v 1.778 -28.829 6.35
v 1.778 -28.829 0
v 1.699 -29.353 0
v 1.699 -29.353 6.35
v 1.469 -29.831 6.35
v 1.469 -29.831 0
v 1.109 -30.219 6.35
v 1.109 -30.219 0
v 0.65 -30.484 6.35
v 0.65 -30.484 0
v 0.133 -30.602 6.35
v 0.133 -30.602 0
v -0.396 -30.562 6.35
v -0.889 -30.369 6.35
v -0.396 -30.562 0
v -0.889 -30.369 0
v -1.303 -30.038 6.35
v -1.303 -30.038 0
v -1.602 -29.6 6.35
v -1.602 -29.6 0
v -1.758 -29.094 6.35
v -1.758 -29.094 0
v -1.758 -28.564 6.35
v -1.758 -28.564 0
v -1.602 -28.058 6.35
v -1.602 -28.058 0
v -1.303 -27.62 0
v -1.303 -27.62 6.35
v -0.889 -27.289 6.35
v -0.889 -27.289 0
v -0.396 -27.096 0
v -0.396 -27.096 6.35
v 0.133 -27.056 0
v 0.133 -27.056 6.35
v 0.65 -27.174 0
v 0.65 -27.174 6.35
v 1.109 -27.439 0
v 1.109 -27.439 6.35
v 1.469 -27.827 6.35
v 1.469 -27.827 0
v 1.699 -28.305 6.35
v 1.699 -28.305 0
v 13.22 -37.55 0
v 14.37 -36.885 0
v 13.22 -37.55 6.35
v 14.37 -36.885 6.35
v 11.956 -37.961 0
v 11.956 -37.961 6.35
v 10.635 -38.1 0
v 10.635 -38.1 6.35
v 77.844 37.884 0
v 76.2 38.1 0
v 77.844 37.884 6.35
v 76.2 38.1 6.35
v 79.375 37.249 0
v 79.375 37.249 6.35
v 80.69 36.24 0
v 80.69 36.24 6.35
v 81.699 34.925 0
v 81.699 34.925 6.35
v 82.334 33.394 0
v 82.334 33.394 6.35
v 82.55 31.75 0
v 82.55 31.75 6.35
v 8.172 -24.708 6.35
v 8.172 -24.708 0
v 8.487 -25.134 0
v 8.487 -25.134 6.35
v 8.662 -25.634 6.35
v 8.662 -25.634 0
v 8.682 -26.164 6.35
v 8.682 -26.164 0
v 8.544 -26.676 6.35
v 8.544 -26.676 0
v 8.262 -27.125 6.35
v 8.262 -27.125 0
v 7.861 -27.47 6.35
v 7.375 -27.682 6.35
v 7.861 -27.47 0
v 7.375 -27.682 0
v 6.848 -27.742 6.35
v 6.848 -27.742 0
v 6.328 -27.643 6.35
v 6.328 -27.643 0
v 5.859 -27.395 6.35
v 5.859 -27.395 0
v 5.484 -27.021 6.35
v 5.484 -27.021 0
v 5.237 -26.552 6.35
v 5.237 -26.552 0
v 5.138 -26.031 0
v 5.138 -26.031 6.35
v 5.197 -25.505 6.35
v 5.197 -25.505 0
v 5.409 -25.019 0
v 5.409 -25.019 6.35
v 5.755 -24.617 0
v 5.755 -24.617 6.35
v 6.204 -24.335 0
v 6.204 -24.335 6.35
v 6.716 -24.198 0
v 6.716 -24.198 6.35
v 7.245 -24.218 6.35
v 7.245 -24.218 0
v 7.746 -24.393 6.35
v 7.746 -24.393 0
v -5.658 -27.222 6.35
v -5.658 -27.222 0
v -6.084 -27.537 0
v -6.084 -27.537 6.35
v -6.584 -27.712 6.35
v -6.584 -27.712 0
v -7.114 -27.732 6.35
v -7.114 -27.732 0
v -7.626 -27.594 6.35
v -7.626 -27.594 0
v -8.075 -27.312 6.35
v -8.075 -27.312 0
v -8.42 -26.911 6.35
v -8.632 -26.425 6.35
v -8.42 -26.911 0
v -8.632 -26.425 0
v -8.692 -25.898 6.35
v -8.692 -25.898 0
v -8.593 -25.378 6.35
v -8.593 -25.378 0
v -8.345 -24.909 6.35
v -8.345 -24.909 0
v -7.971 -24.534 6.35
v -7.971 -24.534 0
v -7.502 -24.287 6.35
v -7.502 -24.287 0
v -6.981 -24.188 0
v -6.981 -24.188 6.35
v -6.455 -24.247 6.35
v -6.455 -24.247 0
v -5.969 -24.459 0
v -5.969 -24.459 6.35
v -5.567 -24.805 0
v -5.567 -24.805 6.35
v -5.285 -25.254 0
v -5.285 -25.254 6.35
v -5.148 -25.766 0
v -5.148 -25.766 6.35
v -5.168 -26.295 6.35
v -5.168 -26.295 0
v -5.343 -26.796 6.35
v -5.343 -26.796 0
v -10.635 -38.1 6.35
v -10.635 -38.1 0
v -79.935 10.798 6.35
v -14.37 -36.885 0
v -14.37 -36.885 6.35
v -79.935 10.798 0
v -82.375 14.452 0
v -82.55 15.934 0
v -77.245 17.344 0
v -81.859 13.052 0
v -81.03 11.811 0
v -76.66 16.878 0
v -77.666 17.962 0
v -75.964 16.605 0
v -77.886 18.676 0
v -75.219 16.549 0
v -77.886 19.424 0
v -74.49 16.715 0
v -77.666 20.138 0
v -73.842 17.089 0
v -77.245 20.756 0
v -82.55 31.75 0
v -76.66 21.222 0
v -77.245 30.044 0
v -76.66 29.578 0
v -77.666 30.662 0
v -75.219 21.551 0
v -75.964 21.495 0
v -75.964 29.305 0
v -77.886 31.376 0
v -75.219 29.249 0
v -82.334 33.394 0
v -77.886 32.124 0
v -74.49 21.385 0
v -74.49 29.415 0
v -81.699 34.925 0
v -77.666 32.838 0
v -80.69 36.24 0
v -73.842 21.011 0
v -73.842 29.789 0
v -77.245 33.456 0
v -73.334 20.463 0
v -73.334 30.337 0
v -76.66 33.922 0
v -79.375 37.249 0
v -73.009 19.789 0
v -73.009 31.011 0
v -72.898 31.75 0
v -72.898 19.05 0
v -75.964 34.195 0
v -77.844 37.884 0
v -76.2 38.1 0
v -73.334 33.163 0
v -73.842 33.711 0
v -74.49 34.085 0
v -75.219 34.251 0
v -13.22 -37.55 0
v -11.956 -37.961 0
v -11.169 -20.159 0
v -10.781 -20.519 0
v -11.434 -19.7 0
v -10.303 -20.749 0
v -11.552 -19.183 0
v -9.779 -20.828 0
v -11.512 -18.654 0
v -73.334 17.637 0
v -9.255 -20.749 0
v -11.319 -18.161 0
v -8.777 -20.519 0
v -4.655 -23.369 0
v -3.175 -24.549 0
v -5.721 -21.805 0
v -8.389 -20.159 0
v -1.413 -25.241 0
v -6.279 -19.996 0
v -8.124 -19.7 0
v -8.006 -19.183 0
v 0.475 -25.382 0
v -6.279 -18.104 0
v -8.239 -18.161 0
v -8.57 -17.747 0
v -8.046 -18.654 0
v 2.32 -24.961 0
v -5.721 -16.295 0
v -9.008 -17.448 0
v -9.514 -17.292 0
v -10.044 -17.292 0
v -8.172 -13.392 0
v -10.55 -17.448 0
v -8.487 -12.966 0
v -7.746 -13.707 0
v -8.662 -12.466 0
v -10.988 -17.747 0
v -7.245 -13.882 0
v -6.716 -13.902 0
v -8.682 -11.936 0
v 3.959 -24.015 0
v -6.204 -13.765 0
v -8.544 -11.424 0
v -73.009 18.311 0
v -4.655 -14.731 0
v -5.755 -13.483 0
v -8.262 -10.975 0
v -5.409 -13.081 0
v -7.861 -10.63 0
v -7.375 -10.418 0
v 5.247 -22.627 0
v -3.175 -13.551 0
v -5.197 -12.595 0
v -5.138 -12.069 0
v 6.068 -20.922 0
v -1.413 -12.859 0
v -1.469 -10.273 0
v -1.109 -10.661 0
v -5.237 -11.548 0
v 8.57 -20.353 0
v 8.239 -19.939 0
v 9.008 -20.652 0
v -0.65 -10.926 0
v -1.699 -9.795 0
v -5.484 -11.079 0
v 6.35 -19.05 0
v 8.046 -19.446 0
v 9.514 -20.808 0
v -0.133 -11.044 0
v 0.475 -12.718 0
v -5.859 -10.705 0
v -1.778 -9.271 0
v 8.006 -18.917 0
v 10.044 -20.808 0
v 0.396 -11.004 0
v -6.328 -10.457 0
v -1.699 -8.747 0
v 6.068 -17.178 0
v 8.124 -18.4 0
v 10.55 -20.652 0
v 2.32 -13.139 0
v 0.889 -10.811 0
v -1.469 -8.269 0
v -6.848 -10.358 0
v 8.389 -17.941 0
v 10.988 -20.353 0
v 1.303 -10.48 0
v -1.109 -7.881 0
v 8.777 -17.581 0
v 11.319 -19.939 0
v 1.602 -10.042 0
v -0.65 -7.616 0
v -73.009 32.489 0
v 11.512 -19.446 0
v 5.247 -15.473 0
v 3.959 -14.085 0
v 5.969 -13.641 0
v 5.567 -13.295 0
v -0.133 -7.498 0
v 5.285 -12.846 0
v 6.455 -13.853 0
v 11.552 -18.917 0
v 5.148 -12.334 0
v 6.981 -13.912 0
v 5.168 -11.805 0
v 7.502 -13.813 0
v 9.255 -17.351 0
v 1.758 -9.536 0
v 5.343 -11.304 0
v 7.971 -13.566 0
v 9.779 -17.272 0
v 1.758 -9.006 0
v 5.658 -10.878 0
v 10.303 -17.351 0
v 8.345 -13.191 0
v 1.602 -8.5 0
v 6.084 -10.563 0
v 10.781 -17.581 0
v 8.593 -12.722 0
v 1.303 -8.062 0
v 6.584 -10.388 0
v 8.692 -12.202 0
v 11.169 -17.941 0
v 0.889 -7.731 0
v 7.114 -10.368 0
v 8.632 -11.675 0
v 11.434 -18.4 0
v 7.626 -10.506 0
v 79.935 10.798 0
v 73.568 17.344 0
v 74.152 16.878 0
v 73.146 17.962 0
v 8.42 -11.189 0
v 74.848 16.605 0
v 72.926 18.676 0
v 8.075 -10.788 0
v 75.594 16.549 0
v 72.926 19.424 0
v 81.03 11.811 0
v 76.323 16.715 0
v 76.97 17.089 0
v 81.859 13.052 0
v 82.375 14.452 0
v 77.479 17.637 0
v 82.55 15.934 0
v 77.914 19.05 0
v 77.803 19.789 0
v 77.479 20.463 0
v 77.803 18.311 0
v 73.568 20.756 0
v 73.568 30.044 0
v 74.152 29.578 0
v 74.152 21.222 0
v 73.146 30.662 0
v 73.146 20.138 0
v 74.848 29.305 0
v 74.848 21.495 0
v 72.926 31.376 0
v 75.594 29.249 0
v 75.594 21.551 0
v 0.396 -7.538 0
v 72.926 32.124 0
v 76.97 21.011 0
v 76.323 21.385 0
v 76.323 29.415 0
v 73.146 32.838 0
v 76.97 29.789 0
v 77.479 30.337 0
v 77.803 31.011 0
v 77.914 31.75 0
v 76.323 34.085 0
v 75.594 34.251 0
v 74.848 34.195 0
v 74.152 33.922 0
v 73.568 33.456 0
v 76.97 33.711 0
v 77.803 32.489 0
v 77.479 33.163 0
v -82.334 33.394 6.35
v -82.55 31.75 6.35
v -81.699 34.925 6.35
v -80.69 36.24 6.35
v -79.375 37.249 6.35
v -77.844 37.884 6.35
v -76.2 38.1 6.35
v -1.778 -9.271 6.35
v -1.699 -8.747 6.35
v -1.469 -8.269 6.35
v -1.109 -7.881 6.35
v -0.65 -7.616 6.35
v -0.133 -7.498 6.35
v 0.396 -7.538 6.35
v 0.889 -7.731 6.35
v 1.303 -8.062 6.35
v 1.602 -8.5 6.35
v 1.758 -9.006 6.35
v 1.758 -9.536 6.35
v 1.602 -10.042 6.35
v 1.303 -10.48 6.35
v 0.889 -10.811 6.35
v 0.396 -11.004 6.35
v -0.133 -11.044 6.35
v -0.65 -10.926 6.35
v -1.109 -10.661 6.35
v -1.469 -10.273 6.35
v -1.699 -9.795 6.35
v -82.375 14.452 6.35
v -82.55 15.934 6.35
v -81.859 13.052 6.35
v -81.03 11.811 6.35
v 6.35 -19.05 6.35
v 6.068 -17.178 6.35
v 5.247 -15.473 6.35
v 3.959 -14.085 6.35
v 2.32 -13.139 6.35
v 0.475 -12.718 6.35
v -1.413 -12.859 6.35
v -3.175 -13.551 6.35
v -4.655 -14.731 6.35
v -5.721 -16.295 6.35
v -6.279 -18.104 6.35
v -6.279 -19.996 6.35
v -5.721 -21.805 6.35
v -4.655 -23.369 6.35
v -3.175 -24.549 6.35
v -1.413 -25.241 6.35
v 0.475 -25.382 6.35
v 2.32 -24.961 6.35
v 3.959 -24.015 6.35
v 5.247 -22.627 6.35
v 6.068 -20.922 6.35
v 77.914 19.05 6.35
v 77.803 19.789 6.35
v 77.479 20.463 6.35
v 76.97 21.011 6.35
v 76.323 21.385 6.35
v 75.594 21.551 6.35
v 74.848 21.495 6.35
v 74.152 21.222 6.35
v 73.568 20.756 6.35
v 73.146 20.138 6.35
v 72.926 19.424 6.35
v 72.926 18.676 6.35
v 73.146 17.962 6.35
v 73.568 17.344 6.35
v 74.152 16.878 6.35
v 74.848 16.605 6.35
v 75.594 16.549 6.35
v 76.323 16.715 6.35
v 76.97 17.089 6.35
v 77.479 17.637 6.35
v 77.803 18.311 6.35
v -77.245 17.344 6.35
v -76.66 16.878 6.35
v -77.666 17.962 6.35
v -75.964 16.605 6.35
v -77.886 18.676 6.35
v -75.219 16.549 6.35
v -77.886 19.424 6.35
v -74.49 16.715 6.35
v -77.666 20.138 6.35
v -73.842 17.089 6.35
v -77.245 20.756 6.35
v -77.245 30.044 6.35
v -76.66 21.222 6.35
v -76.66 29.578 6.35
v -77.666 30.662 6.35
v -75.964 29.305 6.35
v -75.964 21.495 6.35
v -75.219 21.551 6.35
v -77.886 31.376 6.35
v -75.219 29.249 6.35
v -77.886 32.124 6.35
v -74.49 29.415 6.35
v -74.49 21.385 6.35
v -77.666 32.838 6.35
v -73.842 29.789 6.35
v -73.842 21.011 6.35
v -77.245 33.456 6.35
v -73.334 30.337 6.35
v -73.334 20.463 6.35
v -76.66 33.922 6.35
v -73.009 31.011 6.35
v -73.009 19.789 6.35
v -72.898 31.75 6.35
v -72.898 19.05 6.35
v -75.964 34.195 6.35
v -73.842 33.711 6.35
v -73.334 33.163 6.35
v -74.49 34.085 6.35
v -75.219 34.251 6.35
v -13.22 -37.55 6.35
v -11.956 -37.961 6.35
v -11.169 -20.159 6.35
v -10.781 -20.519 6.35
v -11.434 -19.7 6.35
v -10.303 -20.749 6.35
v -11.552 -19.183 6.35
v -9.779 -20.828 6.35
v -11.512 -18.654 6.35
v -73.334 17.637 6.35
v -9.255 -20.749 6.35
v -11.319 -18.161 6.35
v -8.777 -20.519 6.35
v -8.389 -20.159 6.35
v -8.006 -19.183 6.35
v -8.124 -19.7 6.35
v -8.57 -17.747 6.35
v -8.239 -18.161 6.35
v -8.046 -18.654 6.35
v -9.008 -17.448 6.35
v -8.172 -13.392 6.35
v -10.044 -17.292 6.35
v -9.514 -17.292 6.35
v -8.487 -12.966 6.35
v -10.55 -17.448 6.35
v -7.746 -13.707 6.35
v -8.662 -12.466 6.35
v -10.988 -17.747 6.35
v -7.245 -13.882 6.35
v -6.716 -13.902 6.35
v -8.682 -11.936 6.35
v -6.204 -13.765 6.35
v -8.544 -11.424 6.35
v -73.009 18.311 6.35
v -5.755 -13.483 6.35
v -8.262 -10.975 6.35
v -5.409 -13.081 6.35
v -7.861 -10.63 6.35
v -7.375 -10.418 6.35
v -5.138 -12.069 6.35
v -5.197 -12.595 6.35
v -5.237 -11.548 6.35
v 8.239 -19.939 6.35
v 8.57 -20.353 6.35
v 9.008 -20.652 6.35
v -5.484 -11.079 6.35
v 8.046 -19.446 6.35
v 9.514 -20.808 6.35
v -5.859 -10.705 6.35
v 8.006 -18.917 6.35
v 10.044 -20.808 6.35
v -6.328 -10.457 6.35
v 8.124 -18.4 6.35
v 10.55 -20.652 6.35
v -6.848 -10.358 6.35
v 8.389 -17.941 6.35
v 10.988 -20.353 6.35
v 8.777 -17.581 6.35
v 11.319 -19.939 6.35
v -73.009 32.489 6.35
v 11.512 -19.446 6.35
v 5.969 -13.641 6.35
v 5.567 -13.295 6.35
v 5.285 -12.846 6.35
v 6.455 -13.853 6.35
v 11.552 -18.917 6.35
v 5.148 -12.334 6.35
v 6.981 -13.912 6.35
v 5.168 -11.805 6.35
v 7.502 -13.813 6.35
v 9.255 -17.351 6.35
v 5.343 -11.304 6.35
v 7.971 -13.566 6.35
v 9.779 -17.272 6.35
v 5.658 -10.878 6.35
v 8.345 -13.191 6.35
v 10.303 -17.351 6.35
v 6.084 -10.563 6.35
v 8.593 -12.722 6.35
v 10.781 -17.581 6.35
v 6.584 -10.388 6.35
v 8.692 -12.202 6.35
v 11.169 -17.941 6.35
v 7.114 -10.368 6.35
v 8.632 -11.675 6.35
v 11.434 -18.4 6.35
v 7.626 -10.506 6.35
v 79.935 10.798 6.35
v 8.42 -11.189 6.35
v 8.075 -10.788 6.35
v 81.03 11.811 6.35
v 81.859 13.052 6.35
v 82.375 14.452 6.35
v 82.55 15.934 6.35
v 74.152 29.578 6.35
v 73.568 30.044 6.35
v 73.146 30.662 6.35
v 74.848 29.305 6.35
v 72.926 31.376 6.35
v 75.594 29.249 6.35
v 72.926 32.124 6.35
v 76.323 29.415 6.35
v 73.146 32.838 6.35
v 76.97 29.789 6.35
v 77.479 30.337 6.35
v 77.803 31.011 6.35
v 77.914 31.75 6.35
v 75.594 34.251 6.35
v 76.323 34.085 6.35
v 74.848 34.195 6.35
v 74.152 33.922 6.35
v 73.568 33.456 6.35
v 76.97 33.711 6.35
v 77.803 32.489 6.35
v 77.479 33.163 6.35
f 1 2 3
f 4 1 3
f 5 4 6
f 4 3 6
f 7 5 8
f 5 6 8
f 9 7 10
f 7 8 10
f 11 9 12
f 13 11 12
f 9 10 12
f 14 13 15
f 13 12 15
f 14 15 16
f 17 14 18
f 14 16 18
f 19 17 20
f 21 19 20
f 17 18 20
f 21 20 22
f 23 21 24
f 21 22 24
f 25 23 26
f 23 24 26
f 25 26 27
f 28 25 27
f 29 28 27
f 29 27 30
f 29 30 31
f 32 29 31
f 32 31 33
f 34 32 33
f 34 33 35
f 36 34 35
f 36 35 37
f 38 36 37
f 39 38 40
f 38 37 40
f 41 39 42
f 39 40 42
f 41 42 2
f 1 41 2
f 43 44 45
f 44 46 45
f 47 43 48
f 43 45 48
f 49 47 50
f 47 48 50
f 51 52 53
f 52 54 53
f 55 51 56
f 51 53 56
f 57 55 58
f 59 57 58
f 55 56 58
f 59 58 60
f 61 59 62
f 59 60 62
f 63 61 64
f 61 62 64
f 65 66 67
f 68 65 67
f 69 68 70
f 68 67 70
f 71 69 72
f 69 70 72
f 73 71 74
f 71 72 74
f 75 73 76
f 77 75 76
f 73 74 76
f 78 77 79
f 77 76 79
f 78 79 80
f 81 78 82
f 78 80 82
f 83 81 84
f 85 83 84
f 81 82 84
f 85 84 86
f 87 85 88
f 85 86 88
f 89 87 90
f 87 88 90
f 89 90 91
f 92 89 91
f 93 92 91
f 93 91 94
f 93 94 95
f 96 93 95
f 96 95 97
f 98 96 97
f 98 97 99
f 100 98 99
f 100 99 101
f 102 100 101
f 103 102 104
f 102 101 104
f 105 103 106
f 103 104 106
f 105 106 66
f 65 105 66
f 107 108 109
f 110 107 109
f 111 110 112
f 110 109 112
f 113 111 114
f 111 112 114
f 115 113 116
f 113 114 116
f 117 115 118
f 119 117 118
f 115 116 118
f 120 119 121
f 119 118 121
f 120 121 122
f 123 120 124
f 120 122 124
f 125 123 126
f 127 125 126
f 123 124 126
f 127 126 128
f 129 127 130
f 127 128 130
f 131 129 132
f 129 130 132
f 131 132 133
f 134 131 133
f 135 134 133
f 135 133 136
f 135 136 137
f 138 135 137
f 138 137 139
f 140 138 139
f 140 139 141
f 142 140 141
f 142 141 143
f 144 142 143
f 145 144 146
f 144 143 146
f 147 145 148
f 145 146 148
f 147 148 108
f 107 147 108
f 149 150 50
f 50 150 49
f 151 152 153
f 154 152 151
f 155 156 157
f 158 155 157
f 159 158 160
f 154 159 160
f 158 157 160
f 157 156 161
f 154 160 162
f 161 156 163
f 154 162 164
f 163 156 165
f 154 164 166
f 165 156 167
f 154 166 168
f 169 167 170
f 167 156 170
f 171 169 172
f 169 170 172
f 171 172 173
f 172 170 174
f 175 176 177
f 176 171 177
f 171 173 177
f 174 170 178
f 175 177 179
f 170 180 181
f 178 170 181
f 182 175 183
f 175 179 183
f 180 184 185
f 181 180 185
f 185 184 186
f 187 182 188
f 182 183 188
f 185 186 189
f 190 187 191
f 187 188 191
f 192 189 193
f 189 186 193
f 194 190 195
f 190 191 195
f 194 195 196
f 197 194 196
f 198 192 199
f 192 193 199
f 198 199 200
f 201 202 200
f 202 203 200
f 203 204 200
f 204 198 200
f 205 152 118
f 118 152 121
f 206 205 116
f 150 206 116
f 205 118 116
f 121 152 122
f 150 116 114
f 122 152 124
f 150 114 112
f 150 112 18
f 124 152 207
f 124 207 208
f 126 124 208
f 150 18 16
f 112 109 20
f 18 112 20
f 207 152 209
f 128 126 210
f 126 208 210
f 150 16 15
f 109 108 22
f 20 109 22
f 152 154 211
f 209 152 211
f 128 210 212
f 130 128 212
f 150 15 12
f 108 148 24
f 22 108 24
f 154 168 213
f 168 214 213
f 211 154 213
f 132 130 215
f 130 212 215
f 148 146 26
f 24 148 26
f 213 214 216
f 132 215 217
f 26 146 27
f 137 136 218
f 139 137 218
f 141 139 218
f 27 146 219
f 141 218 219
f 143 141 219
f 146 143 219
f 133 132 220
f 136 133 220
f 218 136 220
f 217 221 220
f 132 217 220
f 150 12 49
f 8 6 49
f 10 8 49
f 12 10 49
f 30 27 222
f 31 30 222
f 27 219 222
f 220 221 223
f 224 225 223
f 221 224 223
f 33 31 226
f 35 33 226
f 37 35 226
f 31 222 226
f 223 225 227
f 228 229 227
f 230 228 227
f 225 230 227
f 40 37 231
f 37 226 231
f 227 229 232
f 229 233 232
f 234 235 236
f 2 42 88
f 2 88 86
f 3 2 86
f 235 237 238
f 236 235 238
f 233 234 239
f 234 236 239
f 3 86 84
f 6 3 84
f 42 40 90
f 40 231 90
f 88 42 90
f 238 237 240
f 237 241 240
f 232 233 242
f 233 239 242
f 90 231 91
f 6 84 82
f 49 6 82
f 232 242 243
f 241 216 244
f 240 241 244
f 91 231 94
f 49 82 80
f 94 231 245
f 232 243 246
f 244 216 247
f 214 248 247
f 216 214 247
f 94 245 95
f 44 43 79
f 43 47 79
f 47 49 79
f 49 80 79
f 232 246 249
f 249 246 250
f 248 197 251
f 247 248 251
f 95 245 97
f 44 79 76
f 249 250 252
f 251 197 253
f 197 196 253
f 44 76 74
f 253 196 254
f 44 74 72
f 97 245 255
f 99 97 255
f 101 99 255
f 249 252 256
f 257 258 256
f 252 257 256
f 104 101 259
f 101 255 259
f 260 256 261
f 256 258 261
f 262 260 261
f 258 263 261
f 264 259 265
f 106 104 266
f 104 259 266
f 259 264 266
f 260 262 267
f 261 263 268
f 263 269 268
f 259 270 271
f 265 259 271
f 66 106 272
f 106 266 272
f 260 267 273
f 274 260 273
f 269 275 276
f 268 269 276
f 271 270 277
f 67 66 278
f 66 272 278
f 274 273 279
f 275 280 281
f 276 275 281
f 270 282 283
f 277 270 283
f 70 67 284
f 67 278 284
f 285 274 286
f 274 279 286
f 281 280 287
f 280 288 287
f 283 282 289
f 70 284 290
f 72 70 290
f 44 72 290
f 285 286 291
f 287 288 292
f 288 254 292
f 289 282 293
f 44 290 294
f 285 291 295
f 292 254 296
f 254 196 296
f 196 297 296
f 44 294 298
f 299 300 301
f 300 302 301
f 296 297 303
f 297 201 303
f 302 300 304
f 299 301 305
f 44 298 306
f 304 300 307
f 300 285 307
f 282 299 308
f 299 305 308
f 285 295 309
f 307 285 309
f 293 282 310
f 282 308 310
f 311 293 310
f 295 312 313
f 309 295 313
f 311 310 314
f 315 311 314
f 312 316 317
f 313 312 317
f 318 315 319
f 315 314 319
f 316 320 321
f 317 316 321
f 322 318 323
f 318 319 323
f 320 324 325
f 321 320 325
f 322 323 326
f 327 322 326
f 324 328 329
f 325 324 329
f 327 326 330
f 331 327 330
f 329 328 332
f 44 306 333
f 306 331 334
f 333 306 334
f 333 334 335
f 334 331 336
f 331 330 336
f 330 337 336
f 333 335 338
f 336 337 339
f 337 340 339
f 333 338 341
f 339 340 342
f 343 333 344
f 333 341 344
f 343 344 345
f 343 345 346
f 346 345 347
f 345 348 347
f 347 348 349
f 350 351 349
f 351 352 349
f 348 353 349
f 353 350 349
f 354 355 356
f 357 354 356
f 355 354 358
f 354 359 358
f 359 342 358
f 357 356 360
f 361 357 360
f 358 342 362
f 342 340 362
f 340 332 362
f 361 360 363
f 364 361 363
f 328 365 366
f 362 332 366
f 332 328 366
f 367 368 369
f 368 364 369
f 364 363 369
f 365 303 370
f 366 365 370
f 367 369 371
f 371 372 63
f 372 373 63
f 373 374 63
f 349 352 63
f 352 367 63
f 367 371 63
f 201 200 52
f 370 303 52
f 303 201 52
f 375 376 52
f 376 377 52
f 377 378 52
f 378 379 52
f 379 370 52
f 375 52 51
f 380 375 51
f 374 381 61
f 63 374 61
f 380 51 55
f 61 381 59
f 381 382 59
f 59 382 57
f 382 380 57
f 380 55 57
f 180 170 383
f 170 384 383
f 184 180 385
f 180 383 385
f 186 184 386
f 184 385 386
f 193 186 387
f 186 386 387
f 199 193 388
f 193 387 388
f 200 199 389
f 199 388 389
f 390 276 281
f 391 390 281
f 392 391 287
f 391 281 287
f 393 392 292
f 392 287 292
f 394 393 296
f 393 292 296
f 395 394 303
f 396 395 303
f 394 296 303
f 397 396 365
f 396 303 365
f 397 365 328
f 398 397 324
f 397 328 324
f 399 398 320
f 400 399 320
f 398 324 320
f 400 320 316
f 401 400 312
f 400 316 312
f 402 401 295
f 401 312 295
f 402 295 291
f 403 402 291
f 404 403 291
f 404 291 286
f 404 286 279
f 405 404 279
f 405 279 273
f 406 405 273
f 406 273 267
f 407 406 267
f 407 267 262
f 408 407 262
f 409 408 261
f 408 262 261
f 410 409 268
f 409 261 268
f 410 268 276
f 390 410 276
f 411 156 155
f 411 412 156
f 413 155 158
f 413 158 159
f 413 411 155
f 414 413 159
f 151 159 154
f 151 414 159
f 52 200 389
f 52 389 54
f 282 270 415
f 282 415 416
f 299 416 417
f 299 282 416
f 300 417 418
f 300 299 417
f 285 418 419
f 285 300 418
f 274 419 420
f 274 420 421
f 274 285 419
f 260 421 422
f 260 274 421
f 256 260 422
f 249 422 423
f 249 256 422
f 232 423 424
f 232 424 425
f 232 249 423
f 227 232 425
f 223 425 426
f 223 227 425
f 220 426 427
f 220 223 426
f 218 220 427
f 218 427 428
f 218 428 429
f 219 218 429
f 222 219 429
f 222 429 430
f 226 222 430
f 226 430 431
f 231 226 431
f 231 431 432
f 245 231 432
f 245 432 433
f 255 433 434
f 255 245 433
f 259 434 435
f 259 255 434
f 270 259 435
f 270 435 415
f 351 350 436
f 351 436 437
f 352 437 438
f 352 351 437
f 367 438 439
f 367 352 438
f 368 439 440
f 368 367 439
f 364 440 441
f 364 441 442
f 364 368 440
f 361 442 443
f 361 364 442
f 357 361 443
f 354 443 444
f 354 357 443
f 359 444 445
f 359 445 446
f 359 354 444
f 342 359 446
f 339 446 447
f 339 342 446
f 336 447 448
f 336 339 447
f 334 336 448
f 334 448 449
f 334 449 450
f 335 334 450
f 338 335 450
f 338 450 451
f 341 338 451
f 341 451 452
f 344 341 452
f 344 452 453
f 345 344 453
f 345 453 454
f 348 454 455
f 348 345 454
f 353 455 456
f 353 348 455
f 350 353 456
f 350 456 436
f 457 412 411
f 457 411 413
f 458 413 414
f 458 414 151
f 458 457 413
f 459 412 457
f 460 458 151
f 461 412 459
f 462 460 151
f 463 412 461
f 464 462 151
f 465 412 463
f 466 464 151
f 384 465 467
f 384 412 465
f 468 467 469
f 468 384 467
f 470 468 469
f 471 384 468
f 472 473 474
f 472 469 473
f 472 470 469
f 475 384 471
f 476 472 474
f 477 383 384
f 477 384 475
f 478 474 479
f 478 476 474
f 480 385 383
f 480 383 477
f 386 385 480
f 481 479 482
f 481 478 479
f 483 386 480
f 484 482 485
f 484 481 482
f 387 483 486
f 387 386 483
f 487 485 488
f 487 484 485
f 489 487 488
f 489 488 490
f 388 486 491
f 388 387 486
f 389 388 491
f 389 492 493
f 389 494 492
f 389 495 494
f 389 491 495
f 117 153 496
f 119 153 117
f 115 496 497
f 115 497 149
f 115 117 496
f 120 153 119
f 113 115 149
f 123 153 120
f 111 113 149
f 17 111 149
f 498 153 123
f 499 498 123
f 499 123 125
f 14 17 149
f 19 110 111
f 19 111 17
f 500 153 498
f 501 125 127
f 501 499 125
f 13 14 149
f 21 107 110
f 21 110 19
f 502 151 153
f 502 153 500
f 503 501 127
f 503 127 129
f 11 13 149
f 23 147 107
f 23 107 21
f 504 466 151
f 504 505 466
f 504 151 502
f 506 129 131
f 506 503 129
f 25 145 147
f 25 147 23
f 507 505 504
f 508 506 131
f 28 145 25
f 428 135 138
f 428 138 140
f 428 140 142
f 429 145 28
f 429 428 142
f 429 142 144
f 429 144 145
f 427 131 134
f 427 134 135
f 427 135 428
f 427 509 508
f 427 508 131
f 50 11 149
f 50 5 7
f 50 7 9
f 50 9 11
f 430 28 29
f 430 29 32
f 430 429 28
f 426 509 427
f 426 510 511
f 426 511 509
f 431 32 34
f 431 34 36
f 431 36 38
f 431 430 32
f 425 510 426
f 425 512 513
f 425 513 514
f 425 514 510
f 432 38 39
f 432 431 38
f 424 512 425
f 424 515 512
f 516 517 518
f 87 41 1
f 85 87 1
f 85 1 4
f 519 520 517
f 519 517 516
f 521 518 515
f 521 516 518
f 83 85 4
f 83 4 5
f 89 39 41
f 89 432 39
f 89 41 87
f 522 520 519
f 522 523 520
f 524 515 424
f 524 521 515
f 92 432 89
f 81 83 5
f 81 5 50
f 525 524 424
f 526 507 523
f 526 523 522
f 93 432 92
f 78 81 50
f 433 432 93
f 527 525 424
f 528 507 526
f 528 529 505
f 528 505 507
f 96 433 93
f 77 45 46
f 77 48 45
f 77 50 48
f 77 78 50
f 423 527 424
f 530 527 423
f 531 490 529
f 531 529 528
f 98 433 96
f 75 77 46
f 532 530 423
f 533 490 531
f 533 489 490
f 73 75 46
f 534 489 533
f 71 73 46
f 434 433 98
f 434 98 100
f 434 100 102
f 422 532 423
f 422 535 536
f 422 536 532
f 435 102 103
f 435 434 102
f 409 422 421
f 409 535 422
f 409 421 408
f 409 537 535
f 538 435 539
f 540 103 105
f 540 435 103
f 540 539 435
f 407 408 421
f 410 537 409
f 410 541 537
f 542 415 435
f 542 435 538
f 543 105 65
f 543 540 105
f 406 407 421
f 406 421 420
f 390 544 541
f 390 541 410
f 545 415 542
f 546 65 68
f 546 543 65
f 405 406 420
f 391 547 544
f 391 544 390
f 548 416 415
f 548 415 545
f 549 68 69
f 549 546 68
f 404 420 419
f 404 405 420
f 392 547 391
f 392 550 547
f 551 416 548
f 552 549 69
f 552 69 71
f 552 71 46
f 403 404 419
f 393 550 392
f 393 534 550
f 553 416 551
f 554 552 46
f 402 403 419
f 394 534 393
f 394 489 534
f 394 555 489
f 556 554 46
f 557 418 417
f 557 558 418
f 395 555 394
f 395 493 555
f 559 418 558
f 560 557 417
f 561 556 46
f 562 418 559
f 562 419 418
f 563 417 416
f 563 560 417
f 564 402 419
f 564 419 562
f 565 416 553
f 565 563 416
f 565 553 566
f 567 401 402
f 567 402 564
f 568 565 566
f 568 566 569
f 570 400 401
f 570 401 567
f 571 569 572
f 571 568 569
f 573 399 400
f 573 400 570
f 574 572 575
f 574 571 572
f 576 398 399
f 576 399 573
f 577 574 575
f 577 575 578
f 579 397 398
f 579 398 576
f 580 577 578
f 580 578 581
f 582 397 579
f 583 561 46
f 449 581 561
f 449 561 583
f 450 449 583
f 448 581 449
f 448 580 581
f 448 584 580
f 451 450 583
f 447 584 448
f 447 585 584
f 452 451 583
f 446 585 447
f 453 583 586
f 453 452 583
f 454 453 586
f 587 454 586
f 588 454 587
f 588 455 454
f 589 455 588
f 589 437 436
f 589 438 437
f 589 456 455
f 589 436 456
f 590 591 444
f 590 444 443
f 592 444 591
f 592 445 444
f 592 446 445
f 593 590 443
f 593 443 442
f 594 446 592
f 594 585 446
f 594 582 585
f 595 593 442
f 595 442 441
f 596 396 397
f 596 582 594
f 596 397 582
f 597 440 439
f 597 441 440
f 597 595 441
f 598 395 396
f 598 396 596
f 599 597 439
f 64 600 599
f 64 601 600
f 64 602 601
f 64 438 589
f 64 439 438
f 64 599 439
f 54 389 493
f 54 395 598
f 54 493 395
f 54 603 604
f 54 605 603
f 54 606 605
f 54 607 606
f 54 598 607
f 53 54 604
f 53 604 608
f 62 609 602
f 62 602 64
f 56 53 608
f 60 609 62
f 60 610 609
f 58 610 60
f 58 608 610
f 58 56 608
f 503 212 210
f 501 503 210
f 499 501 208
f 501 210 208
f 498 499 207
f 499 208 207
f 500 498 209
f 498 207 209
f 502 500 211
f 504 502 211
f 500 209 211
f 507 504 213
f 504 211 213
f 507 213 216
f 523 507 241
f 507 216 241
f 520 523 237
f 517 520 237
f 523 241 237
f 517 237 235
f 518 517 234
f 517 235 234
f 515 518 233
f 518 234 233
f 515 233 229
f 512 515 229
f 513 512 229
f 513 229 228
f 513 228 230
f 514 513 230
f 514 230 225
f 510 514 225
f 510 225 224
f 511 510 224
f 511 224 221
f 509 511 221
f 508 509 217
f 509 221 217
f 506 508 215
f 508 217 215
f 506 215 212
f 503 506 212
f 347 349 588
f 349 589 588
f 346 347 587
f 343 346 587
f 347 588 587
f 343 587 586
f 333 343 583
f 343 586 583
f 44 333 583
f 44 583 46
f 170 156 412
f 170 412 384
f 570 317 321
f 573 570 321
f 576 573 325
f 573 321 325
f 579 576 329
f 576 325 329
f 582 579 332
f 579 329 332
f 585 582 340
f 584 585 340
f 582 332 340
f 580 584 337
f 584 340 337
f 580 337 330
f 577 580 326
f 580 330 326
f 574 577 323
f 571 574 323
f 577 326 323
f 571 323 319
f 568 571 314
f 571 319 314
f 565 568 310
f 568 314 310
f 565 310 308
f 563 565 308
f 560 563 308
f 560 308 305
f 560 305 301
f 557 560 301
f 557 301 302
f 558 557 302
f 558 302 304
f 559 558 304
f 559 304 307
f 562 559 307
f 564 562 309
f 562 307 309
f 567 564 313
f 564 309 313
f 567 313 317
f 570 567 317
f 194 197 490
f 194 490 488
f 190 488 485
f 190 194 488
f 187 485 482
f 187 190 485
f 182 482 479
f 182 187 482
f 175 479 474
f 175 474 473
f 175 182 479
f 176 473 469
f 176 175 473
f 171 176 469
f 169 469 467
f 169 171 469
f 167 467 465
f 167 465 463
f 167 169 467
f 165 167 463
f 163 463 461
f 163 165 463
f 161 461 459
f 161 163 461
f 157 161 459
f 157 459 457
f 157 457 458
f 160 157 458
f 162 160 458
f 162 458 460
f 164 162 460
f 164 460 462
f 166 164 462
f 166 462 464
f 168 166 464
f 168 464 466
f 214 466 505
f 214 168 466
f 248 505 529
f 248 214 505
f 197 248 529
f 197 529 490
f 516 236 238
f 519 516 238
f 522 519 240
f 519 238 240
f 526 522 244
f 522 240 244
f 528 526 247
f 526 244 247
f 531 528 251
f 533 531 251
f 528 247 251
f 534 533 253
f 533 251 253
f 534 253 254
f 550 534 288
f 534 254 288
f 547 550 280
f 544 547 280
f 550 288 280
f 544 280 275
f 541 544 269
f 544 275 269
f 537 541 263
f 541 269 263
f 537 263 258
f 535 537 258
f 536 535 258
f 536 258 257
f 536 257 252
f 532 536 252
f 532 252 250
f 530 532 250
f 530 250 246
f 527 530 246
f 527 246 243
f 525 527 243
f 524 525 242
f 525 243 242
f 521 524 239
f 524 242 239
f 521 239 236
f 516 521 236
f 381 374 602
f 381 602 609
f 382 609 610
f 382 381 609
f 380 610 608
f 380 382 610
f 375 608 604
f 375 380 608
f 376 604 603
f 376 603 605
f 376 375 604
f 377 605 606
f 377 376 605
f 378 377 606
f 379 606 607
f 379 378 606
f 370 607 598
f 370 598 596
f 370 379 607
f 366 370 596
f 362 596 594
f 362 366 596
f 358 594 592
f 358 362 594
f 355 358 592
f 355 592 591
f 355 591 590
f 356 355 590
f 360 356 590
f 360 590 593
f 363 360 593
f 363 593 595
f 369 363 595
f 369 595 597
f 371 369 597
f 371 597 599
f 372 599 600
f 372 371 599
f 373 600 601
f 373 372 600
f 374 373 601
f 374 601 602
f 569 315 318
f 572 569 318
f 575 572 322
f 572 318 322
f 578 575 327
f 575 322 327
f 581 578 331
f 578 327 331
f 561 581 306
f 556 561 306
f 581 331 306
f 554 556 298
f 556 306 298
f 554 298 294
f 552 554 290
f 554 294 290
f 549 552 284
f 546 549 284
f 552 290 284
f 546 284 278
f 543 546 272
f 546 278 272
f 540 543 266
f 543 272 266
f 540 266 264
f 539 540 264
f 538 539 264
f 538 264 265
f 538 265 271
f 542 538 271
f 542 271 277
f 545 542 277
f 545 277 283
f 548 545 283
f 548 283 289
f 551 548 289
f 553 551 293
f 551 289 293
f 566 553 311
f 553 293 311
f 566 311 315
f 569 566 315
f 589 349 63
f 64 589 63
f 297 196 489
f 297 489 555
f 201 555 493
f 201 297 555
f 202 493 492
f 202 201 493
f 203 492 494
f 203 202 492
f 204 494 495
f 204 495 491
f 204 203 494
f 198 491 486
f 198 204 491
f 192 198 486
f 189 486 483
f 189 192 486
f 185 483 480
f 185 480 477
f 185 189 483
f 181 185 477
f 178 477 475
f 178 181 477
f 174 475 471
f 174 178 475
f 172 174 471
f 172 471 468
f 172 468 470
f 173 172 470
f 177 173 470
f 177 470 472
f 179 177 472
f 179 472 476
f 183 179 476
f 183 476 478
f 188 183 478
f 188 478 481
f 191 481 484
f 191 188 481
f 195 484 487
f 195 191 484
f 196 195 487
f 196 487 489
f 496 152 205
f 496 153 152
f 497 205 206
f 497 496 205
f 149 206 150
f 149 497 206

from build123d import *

# Parameters (mm, degrees)
SKETCH1_W           = 165.1
SKETCH1_H           = 76.2
SKETCH1_R           = 6.35
SKETCH1_R_2         = 2.50825
BOSS_EXTRUDE1_DEPTH = 6.35
CUT_EXTRUDE1_DEPTH  = 6.35
FILLET1_R           = 6.35
SKETCH3_R           = 1.778
CUT_EXTRUDE2_DEPTH  = 6.35
CIRPATTERN1_COUNT   = 8


with BuildPart() as part:
    # Sketch1 → Boss-Extrude1 (new body)
    with BuildSketch(Plane.XY):
        Rectangle(SKETCH1_W, SKETCH1_H)
        with Locations((0, -19.05)):
            Circle(SKETCH1_R, mode=Mode.SUBTRACT)
        with Locations((-75.40625, 31.75)):
            Circle(SKETCH1_R_2, mode=Mode.SUBTRACT)
        with Locations((75.40625, 31.75)):
            Circle(SKETCH1_R_2, mode=Mode.SUBTRACT)
        with Locations((75.40625, 19.05)):
            Circle(SKETCH1_R_2, mode=Mode.SUBTRACT)
        with Locations((-75.40625, 19.05)):
            Circle(SKETCH1_R_2, mode=Mode.SUBTRACT)
    extrude(amount=BOSS_EXTRUDE1_DEPTH)

    # Sketch2 → Cut-Extrude1 (cut)
    with BuildSketch(Plane(origin=(0, 0, 0), x_dir=(-1, 0, 0), z_dir=(0, 0, -1))):
        Polygon((12.7, -38.1), (82.55, 12.7), (82.55, -38.1), align=None)
        Polygon((-82.55, -38.1), (-82.55, 12.7), (-12.7, -38.1), align=None)
    extrude(amount=-CUT_EXTRUDE1_DEPTH, mode=Mode.SUBTRACT)

    # Fillet1
    fillet1_edges = [part.edges().sort_by_distance(p)[0] for p in [
        (-12.7, -38.1, 3.175),
        (-82.55, 12.7, 3.175),
        (12.7, -38.1, 3.175),
        (82.55, 12.7, 3.175),
        (-82.55, 38.1, 3.175),
        (82.55, 38.1, 3.175),
    ]]
    fillet(fillet1_edges, radius=FILLET1_R)

    # Sketch3 → Cut-Extrude2 (cut)
    with BuildSketch(Plane(origin=(0, 0, 0), x_dir=(-1, 0, 0), z_dir=(0, 0, -1))):
        with Locations((0, -9.271)):
            Circle(SKETCH3_R)
    cut_extrude2 = extrude(amount=-CUT_EXTRUDE2_DEPTH, mode=Mode.SUBTRACT)

    # CirPattern1: Cut-Extrude2 ×8 about axis
    cirpattern1_axis = Axis((0, -19.05, 0), (0, 0, 1))
    for i in range(1, CIRPATTERN1_COUNT):
        add(cut_extrude2.rotate(cirpattern1_axis, i * 360 / CIRPATTERN1_COUNT), mode=Mode.SUBTRACT)


solid = part.part
